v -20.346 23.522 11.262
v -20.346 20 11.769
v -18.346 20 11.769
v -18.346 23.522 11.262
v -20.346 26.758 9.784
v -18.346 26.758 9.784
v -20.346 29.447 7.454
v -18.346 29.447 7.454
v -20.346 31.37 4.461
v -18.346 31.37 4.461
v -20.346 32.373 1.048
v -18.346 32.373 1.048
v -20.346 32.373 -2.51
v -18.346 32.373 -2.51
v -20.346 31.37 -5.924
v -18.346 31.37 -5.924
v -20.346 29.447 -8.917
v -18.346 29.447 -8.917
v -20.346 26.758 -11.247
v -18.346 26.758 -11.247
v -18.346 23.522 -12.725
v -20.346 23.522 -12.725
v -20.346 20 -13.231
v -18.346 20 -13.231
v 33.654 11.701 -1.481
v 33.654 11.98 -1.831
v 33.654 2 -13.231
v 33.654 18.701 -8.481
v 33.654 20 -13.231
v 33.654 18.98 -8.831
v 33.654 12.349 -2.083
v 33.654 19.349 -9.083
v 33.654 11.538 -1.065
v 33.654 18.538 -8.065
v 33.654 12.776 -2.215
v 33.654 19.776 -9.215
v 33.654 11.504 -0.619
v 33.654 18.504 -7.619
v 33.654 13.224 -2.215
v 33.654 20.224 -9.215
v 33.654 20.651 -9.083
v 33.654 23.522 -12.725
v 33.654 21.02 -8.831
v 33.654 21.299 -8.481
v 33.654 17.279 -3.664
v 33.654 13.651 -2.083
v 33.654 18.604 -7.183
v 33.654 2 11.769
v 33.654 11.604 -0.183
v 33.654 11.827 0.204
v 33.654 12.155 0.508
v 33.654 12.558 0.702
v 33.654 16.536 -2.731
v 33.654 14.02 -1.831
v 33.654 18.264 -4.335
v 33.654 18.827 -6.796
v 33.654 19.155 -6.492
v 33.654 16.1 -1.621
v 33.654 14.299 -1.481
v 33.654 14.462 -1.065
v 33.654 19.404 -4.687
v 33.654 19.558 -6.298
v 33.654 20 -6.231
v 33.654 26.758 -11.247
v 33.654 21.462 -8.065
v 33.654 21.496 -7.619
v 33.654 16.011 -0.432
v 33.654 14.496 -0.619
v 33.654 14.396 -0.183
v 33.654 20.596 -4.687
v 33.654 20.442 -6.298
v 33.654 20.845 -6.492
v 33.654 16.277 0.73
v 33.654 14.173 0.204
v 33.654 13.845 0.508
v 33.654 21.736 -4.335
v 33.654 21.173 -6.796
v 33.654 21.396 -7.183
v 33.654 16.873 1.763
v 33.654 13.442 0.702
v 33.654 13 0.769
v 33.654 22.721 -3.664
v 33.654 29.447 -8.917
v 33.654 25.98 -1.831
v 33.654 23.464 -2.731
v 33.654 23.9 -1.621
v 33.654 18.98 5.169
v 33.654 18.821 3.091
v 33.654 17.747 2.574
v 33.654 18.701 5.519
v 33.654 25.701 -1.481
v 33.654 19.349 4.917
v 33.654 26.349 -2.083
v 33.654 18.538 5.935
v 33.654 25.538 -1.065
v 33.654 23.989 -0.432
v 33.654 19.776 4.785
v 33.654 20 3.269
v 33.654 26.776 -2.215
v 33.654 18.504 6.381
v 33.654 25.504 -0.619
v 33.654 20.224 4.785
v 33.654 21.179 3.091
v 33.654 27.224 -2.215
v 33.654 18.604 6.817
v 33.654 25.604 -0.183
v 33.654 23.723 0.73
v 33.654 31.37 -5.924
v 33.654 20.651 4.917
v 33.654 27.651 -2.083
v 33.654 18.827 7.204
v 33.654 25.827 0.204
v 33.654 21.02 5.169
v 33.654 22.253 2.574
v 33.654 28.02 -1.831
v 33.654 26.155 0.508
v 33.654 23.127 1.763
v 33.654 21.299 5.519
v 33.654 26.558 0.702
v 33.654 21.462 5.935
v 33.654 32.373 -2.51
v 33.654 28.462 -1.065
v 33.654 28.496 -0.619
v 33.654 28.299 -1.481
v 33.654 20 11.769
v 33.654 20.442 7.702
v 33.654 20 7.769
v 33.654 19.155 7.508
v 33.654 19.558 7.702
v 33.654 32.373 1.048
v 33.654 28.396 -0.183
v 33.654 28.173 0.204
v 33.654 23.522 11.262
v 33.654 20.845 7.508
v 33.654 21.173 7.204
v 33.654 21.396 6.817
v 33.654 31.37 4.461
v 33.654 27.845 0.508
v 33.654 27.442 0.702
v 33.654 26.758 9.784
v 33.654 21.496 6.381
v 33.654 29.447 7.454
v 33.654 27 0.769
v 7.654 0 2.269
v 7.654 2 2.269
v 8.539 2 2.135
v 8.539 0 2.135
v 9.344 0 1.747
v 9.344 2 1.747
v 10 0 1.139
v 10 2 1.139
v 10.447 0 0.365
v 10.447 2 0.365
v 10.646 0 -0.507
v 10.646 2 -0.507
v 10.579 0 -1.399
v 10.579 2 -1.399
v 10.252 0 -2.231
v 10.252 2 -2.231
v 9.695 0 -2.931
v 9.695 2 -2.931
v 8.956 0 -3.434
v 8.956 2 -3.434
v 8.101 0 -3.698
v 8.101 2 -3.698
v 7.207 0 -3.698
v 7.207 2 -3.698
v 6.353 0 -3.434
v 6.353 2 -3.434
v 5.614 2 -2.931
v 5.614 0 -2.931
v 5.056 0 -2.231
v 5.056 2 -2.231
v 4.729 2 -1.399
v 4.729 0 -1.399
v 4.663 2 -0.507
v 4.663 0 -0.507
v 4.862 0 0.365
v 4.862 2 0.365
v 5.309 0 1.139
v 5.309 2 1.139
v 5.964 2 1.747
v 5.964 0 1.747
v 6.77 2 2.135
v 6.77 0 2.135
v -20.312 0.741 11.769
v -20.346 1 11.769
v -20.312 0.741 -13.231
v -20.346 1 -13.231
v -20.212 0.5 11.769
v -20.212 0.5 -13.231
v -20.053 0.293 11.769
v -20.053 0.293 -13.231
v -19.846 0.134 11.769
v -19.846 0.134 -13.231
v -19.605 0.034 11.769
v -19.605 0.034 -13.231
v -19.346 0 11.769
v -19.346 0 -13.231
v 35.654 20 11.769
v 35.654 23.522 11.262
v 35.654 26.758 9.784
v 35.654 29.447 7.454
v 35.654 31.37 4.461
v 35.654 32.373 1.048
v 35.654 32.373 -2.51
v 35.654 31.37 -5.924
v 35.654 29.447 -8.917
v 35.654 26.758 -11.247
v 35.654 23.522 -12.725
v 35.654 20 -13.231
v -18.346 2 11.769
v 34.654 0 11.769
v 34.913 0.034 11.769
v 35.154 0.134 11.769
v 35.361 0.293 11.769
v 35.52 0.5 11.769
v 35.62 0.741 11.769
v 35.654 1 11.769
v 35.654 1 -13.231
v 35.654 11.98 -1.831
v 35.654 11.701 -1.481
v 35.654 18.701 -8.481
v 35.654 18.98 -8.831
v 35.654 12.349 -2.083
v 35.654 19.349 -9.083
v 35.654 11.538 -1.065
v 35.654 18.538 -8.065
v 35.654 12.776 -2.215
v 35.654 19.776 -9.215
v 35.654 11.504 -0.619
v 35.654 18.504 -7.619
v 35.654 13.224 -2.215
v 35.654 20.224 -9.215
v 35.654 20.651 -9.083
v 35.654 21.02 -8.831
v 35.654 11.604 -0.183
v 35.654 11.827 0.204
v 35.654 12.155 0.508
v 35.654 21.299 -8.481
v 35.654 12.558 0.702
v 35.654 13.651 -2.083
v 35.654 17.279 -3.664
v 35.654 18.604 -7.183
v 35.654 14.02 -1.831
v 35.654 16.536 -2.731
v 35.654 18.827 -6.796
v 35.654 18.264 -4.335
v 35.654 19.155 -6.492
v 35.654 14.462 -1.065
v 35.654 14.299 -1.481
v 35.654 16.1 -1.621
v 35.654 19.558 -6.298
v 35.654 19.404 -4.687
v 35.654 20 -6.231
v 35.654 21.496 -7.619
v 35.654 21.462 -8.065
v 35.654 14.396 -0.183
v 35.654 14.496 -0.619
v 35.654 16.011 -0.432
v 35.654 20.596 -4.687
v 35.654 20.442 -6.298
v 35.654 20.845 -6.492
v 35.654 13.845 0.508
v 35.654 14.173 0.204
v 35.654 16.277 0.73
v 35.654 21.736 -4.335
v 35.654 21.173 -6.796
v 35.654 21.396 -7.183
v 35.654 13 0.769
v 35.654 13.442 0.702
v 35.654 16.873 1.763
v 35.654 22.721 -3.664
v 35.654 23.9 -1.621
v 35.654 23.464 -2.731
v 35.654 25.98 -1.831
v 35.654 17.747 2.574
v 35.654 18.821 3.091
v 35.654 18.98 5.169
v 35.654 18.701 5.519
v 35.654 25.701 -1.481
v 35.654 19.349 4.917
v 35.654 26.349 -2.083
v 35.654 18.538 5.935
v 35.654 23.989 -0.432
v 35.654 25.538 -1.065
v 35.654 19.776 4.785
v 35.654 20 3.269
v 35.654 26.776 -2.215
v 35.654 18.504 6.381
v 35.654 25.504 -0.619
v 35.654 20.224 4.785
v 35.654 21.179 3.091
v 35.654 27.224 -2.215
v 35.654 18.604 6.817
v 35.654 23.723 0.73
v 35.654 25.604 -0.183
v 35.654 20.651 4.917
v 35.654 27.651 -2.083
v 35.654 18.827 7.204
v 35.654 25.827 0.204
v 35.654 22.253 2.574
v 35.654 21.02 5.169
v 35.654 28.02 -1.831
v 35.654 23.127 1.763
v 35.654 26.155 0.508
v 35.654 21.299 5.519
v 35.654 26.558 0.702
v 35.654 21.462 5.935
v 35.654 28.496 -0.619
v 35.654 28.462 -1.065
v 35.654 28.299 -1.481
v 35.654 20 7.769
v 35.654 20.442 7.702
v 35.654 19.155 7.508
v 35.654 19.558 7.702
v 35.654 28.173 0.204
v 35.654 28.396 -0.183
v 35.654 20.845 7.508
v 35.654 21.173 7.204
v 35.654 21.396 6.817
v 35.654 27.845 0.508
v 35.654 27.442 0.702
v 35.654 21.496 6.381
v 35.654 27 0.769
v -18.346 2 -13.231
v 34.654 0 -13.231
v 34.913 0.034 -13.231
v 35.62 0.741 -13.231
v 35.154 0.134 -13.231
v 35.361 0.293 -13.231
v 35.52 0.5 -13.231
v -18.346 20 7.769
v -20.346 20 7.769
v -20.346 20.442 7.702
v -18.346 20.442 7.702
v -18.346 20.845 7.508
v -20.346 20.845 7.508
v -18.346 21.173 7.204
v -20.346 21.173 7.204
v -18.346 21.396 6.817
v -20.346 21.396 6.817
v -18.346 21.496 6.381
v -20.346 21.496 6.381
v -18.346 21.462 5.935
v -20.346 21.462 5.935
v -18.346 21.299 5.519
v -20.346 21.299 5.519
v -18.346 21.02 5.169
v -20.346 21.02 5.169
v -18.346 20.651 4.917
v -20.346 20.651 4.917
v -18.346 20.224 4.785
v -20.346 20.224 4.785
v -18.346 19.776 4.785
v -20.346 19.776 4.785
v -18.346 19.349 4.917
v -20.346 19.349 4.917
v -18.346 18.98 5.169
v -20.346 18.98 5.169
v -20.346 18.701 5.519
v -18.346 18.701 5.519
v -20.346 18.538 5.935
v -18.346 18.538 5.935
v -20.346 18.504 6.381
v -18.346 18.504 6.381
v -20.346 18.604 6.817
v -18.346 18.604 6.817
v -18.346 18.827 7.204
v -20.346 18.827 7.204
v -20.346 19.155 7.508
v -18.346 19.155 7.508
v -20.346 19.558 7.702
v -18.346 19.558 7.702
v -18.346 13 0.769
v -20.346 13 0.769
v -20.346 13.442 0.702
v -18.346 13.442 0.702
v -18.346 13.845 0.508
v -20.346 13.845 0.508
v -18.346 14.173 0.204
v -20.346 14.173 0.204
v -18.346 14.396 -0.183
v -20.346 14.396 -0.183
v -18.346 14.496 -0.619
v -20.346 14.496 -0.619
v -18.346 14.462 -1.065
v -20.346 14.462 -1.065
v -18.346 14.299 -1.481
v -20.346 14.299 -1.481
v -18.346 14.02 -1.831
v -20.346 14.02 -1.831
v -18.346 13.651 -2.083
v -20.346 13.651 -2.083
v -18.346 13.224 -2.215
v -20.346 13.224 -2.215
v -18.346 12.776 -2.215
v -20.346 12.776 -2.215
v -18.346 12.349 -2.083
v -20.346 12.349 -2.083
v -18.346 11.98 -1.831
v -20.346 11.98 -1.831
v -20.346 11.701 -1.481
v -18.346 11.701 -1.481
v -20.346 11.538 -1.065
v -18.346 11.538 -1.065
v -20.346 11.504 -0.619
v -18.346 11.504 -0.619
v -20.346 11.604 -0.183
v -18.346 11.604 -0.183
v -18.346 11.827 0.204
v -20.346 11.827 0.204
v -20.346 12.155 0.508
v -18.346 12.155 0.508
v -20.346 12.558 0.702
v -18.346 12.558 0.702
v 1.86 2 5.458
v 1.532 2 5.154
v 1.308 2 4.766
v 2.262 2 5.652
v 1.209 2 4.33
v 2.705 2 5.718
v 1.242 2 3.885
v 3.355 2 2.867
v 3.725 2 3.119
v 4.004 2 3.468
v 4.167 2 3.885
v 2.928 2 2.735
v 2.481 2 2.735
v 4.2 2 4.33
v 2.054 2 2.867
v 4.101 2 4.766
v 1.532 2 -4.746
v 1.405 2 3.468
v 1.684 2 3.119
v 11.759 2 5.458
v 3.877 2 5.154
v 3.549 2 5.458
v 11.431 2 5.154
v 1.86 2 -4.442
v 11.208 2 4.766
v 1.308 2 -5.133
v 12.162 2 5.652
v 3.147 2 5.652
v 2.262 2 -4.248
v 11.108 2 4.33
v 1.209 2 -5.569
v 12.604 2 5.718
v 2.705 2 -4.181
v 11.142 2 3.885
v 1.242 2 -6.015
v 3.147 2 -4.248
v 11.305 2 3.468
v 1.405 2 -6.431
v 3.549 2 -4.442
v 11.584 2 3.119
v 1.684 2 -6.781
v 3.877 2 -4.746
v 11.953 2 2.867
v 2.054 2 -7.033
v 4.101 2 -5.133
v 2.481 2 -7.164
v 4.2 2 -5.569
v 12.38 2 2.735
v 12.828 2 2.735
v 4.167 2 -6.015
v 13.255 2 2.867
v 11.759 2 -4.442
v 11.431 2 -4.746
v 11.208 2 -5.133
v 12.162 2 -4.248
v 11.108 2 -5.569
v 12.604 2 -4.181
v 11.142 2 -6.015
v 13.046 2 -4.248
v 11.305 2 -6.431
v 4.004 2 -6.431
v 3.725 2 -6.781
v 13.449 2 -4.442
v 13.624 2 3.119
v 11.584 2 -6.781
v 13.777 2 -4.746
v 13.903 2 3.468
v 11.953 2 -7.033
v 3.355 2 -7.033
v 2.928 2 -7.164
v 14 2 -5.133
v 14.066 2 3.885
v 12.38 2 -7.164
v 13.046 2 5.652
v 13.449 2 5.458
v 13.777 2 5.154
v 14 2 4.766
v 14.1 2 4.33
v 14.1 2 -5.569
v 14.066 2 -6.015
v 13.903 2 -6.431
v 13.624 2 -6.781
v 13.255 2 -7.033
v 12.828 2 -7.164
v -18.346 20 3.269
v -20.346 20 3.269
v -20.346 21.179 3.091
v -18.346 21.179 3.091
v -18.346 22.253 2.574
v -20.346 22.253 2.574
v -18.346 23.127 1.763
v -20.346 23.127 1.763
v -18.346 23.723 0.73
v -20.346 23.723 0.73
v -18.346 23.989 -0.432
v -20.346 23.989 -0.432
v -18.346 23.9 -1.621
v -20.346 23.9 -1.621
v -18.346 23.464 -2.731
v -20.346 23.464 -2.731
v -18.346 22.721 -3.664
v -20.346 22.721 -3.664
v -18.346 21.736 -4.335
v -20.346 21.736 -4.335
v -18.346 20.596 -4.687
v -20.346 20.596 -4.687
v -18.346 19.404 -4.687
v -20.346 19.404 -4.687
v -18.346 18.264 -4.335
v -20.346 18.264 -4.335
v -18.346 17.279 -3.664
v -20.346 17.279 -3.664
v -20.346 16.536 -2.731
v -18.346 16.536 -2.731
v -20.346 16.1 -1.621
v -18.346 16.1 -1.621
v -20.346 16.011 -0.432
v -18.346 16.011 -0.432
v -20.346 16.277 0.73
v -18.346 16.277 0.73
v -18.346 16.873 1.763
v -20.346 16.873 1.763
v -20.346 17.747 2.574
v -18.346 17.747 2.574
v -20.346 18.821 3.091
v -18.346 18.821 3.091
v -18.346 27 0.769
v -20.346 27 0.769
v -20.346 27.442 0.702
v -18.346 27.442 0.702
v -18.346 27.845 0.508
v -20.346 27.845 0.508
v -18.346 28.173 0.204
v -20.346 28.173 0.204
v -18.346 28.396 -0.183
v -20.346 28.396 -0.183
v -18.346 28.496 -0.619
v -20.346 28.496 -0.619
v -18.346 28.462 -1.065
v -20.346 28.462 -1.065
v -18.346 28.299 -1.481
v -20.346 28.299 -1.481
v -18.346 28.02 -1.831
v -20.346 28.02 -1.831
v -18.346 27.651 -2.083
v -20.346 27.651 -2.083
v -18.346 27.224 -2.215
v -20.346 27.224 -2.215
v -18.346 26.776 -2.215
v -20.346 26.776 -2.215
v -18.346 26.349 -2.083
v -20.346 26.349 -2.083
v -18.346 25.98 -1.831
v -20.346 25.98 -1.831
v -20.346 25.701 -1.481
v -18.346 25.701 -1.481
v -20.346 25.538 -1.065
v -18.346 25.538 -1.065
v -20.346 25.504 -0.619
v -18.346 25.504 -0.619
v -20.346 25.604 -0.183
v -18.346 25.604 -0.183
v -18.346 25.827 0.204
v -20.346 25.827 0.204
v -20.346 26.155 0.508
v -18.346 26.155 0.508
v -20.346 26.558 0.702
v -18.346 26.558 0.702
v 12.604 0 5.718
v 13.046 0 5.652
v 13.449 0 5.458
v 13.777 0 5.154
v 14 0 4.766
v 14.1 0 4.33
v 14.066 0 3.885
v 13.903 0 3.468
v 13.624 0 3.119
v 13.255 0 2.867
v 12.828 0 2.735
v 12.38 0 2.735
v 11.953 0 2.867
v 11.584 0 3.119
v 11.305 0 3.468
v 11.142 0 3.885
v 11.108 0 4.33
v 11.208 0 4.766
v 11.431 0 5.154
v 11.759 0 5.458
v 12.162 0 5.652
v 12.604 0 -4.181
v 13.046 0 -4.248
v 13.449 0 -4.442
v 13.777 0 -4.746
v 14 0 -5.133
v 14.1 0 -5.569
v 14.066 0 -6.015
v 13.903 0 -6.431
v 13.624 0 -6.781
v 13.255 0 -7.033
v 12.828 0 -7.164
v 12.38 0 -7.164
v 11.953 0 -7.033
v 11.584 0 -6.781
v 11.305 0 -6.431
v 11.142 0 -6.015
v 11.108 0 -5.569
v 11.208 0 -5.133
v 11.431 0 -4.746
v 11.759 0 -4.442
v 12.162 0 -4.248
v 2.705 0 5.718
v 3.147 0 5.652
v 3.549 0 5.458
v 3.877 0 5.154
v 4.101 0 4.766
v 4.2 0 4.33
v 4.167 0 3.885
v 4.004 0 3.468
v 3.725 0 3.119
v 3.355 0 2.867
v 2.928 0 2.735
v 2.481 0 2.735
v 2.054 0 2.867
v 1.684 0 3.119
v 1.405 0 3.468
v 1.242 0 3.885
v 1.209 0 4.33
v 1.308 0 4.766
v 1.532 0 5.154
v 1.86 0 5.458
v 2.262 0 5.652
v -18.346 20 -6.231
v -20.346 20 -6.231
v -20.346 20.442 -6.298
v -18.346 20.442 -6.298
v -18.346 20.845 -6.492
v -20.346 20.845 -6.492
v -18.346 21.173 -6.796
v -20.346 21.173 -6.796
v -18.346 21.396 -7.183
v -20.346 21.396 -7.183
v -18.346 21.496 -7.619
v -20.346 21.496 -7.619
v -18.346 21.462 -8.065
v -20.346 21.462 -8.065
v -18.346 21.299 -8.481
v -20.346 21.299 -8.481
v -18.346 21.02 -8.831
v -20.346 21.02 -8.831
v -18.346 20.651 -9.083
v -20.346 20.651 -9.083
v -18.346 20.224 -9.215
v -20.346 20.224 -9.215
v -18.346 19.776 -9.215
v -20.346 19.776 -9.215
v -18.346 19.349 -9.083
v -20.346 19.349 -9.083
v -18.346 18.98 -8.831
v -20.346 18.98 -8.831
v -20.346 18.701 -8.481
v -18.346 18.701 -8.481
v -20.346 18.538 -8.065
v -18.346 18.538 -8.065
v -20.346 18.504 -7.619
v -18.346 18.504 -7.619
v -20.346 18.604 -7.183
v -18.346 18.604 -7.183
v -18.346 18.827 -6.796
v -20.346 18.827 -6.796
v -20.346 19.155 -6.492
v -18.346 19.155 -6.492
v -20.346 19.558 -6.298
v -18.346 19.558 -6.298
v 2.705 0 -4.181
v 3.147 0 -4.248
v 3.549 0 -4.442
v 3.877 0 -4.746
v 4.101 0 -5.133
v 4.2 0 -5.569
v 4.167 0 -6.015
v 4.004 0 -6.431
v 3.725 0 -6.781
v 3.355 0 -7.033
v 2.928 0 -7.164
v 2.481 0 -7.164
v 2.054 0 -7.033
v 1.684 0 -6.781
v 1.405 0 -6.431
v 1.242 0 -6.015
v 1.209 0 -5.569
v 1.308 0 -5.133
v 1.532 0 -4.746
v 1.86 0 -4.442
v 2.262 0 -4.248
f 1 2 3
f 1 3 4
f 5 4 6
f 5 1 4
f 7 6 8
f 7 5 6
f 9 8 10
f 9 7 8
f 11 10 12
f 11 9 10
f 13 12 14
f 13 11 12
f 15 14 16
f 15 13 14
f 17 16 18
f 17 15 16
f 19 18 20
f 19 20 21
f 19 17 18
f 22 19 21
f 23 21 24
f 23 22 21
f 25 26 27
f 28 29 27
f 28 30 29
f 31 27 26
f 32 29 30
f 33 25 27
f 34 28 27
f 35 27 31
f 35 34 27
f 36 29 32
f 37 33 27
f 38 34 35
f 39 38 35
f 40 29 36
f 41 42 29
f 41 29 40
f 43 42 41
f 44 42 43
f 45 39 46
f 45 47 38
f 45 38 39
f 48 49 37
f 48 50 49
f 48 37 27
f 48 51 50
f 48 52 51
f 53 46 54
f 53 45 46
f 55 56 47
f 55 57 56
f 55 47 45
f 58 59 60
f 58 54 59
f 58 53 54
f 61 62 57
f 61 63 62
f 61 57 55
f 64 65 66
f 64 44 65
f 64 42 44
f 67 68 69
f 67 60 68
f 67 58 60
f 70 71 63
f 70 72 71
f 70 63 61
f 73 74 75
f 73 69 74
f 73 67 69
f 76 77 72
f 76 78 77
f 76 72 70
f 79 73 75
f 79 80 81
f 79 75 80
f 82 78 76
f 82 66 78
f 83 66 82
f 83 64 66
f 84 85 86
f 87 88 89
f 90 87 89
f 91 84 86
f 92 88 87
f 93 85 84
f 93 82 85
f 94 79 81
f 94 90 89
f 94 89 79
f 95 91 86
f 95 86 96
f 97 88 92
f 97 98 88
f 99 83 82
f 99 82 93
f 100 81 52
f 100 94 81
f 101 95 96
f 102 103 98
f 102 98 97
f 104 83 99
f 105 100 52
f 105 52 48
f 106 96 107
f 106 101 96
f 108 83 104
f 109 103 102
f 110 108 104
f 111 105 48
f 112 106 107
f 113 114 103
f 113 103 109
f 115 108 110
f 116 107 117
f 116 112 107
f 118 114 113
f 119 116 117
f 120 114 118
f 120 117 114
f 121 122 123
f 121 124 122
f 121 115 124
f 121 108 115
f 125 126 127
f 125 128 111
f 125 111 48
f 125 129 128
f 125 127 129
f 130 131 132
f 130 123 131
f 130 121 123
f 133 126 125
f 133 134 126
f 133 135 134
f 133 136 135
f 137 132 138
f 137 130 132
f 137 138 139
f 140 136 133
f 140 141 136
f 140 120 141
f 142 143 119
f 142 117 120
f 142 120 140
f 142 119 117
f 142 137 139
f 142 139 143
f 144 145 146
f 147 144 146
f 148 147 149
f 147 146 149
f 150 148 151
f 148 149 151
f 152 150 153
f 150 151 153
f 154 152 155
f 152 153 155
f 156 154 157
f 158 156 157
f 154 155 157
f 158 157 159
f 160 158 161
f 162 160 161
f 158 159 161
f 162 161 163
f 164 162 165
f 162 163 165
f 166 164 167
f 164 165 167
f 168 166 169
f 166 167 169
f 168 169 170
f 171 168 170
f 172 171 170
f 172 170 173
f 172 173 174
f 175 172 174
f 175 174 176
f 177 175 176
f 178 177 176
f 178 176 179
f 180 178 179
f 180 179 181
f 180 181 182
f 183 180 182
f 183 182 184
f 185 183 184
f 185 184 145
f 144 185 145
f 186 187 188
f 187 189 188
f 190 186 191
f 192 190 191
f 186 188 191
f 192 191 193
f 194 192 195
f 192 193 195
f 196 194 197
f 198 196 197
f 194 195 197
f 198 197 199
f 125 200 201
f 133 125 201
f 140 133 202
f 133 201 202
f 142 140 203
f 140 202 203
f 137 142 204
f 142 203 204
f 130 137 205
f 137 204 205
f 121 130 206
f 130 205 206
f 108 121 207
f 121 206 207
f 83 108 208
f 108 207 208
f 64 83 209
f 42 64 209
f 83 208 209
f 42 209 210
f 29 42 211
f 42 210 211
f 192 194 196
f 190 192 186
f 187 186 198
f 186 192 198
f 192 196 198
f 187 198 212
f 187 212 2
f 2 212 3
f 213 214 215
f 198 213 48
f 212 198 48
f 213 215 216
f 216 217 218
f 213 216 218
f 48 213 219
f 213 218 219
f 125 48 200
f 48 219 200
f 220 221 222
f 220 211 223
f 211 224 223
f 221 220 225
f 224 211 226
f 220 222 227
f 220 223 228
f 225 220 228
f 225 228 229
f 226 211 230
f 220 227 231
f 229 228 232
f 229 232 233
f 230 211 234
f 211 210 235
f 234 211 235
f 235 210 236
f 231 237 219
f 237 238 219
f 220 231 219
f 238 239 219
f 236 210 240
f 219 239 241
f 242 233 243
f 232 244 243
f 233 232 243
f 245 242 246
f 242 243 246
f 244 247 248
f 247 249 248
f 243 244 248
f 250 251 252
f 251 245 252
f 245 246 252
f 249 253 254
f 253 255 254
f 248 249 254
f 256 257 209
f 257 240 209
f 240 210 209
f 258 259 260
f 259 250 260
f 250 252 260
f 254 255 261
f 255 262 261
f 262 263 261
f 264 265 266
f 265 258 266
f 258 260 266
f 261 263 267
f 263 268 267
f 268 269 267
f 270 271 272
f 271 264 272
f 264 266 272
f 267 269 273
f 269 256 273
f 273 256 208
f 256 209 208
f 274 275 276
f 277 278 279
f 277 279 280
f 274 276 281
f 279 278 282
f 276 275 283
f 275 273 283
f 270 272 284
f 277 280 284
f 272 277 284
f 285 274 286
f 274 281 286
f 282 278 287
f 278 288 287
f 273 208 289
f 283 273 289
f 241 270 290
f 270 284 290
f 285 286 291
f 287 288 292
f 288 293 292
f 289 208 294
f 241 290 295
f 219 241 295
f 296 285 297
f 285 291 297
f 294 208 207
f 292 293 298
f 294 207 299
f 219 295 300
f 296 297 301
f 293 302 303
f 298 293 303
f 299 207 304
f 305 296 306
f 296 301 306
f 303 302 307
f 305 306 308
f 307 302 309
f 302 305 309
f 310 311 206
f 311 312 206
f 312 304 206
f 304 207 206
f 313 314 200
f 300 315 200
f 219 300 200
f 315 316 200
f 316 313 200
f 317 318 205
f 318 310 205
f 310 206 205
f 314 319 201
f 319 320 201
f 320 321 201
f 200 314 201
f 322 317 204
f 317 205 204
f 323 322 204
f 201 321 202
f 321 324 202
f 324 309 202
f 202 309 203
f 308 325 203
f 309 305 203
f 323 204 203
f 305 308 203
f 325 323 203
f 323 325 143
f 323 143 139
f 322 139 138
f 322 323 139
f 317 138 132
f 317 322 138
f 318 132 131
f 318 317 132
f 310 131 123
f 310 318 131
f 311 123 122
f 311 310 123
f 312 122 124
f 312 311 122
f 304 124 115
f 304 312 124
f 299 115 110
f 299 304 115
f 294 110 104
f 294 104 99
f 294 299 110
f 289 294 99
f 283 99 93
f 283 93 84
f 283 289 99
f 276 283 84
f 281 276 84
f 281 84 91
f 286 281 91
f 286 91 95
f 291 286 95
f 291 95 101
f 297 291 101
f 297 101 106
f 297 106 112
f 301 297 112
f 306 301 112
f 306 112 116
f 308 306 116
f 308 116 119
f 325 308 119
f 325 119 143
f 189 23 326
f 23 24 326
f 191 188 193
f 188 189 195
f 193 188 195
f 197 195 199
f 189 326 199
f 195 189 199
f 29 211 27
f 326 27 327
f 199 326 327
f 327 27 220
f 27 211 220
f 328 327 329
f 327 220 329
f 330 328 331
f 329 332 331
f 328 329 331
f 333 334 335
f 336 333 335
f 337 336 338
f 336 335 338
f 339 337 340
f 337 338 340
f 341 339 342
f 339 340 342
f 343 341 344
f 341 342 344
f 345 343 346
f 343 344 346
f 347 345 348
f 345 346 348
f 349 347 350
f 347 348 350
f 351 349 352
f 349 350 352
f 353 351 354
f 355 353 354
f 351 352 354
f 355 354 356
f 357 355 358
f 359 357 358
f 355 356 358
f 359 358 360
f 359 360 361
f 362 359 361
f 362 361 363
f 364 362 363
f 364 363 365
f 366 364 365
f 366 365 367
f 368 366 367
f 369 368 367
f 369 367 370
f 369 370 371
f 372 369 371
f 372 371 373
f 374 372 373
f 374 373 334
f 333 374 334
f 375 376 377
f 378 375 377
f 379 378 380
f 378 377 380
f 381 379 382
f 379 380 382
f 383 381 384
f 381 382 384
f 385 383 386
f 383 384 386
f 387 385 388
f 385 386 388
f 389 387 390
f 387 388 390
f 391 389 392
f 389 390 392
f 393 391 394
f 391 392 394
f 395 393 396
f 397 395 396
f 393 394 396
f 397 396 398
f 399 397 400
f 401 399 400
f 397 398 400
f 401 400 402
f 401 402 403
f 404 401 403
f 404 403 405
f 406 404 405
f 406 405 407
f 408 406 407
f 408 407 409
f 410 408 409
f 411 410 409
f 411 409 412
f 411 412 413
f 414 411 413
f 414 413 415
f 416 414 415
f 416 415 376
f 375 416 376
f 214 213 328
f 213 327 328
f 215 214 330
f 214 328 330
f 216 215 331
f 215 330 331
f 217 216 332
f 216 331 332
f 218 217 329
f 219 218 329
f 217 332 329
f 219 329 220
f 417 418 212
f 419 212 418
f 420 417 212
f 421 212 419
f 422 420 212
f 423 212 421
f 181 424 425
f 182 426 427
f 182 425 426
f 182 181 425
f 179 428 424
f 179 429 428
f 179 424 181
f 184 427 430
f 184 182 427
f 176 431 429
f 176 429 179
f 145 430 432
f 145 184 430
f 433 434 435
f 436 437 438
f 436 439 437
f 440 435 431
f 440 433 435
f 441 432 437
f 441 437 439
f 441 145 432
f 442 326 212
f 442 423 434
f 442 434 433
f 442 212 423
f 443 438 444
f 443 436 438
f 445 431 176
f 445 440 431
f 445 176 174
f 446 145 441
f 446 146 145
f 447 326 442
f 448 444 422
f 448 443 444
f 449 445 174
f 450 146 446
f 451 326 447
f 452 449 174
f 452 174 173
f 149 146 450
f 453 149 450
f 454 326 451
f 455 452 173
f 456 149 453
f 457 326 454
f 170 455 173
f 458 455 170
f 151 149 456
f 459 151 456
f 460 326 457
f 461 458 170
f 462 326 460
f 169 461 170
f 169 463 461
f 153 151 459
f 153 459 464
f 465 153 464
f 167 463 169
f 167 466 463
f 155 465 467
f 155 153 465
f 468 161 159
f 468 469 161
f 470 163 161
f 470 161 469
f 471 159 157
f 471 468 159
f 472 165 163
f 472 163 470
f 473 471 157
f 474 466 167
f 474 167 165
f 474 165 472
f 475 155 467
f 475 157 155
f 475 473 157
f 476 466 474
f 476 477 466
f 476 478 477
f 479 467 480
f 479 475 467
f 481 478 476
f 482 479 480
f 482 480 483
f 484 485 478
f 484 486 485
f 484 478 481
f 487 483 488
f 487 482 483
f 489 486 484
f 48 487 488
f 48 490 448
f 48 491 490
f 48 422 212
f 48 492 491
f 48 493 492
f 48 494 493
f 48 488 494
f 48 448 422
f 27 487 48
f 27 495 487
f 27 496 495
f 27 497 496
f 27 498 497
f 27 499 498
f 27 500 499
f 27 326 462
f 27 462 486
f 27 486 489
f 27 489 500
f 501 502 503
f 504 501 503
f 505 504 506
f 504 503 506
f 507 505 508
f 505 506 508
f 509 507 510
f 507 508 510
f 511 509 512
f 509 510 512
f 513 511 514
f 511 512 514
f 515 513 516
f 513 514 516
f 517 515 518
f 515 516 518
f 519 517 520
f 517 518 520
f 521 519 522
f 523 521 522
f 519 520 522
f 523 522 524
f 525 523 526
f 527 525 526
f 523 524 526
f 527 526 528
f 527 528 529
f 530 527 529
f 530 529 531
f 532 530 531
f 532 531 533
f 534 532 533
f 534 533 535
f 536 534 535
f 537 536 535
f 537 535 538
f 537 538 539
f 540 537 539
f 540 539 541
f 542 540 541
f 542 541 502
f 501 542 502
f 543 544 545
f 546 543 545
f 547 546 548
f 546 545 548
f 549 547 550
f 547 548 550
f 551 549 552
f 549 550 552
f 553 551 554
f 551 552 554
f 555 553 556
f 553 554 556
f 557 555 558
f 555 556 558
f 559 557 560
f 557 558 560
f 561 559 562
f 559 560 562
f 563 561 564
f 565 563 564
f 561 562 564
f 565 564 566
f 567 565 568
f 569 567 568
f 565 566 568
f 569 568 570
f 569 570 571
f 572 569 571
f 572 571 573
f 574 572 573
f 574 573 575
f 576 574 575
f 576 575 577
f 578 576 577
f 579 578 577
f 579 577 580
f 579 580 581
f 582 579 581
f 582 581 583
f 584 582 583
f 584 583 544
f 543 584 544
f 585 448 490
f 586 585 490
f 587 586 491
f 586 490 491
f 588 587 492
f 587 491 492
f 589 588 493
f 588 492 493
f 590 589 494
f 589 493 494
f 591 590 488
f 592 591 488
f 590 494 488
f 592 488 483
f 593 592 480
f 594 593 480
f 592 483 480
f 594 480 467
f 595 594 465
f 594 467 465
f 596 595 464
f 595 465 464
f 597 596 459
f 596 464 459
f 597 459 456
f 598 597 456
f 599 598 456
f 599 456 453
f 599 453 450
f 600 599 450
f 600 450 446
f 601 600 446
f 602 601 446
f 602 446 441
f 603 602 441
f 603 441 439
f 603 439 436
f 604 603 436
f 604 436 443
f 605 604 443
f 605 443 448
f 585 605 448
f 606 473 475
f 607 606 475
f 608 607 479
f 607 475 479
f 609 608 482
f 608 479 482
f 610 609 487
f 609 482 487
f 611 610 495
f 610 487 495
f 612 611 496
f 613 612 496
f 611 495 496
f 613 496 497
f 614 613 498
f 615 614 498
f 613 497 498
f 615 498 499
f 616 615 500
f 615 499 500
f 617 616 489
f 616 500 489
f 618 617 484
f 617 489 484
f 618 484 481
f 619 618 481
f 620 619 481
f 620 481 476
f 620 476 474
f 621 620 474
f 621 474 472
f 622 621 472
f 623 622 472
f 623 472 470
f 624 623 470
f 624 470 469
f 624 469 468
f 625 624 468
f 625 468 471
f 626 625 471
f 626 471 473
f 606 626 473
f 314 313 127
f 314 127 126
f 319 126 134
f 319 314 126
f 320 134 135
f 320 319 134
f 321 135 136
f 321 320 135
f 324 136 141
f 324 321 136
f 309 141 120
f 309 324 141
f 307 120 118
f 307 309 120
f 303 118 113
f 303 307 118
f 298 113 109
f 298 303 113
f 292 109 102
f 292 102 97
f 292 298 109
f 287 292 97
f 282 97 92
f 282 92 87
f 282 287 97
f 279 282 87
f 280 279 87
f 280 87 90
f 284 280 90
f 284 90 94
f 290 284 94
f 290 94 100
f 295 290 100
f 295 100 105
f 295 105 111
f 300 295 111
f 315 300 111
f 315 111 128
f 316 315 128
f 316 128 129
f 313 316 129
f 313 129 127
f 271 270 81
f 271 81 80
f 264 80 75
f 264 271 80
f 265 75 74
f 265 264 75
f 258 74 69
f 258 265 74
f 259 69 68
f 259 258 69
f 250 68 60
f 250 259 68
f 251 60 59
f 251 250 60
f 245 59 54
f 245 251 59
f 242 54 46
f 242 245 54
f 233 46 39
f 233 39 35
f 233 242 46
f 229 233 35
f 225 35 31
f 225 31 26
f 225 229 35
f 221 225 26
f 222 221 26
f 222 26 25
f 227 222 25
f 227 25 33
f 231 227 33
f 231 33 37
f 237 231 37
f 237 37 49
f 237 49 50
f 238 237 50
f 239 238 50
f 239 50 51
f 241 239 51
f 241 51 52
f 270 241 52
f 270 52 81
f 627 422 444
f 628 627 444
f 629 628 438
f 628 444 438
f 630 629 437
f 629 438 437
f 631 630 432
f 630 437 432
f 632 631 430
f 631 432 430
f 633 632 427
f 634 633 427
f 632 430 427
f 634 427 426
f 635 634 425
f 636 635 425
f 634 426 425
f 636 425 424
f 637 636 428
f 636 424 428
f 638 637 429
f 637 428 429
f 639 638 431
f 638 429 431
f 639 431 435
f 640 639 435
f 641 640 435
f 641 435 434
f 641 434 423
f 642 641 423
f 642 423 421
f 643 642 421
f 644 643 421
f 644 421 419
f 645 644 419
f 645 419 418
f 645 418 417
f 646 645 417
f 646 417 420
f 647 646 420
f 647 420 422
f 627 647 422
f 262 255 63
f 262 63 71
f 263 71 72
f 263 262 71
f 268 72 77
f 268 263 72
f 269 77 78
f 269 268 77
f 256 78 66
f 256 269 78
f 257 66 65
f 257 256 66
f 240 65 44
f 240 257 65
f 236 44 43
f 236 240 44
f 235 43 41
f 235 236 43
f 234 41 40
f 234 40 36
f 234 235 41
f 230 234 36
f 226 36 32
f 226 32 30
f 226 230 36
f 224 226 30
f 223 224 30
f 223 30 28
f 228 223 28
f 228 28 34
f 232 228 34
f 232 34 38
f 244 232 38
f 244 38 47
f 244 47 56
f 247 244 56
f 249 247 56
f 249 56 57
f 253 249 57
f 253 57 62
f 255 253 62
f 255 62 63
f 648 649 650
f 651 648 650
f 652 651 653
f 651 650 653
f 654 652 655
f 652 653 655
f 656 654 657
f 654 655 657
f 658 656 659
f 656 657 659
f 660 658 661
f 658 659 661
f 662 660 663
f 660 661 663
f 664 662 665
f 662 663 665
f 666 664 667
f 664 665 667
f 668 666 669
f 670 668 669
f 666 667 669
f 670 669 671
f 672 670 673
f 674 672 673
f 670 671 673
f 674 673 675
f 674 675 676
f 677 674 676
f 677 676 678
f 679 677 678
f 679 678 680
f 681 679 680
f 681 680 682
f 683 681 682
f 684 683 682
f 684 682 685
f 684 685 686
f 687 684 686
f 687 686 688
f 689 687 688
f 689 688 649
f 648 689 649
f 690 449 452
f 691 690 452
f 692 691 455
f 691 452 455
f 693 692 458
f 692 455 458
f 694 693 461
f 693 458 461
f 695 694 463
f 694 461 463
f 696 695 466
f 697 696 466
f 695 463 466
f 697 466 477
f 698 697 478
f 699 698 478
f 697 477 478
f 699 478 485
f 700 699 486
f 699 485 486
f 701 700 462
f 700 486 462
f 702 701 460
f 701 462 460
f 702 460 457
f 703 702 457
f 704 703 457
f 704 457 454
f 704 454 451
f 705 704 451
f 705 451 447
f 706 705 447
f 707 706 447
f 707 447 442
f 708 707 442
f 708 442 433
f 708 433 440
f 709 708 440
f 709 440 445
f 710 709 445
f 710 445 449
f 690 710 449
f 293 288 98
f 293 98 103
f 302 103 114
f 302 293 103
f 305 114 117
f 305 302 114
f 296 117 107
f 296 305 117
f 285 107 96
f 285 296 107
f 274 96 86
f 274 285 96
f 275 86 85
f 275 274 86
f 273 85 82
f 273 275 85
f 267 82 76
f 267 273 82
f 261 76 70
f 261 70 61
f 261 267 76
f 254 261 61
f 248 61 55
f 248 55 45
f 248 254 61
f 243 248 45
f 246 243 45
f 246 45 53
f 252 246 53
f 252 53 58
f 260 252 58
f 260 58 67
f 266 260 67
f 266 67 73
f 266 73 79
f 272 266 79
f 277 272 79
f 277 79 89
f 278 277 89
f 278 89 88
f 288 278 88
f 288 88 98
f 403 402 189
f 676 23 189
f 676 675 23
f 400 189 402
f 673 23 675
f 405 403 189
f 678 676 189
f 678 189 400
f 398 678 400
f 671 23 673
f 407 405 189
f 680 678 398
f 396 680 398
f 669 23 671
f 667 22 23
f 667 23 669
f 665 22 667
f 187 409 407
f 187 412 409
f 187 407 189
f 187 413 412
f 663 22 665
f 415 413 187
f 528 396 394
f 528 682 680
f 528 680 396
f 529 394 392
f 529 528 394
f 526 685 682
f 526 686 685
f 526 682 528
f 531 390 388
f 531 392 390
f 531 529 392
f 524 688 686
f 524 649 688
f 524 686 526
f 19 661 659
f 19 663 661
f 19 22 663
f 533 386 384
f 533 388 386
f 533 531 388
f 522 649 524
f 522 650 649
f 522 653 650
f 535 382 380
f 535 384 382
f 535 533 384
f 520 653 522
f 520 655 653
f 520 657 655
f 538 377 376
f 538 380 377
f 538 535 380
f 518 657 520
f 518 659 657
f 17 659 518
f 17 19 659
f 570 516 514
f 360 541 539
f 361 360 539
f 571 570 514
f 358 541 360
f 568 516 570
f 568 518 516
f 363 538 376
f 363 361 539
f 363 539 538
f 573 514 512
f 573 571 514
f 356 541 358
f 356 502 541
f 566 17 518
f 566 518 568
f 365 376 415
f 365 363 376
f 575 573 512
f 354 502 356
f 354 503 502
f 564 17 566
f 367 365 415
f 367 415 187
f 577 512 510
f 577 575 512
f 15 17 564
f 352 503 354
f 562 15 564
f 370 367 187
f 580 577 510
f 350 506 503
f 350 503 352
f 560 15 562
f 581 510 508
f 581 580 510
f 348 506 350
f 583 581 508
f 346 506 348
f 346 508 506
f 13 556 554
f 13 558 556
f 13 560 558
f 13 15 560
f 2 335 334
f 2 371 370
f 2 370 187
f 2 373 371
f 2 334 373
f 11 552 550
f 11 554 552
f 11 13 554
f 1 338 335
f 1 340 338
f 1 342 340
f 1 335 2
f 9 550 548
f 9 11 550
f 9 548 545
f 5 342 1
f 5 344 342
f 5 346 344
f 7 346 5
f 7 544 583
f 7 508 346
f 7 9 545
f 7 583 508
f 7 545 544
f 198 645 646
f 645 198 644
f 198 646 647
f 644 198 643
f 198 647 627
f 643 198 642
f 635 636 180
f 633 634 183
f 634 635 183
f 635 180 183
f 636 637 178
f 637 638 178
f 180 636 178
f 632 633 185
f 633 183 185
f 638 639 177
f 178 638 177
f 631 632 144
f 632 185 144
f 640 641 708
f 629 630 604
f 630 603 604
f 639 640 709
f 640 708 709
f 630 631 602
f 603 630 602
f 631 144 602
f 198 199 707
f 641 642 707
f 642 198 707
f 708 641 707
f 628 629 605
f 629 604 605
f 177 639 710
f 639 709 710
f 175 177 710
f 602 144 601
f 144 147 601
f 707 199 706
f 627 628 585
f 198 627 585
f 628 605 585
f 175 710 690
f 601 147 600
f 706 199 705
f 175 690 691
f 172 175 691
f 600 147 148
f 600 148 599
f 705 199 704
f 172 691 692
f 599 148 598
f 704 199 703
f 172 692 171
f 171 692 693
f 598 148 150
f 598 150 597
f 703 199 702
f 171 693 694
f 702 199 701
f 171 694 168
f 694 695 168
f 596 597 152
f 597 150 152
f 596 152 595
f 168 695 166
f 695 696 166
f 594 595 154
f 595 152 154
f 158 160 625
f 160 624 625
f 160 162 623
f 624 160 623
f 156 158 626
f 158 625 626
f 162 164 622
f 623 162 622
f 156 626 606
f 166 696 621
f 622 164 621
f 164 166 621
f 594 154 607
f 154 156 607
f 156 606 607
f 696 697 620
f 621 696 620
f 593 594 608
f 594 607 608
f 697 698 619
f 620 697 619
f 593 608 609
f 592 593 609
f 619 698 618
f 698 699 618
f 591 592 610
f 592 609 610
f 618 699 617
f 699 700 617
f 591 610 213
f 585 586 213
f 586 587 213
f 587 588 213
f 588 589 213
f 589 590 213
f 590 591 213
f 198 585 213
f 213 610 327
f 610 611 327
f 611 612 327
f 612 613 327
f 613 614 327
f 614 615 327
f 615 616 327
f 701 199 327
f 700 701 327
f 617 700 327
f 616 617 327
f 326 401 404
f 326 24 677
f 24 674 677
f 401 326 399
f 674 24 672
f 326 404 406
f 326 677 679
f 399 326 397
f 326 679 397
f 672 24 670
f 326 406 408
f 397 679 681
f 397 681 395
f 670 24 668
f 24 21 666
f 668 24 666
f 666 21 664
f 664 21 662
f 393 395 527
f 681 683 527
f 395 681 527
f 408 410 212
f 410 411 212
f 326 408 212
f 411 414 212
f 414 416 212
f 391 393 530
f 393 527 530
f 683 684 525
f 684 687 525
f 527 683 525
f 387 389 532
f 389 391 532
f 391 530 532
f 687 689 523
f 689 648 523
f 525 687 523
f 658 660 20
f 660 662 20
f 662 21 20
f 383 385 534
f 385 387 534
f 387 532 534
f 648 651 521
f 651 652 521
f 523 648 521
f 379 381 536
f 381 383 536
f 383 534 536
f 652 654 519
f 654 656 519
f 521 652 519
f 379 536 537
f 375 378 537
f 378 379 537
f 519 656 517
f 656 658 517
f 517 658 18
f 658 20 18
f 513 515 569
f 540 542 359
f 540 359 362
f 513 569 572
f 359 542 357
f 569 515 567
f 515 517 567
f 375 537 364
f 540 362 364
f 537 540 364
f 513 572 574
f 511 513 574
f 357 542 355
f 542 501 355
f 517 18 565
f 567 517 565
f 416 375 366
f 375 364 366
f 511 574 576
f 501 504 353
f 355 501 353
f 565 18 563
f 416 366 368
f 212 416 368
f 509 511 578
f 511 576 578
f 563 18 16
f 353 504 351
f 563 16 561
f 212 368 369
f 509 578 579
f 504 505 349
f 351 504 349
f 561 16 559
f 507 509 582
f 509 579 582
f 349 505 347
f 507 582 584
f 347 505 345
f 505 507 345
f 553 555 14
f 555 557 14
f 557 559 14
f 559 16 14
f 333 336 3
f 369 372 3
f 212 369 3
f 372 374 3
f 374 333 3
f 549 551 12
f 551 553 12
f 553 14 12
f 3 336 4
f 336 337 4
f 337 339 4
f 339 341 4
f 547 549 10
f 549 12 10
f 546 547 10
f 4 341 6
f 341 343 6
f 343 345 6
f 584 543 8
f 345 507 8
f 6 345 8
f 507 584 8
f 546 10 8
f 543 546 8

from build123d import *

# Parameters (mm, degrees)
SKETCH_1_W          = 56
SKETCH_1_H          = 25
EXTRUDE_1_DEPTH     = 2
SKETCH_2_R          = 3
SKETCH_2_R_2        = 1.5
CUT_EXTRUDE_1_DEPTH = 39.082744359
EXTRUDE_2_DEPTH     = 2
CUT_EXTRUDE_2_REACH = 68.086
SKETCH_4_R          = 4
SKETCH_4_R_2        = 1.5
FILLET_1_R          = 1


with BuildPart() as part:
    # 草图1 → 凸台-拉伸1 (new body)
    with BuildSketch(Plane(origin=(0, 0, 0), x_dir=(1, 0, 0), z_dir=(0, 1, 0))):
        with Locations((7.654255319, 0.731382979)):
            Rectangle(SKETCH_1_W, SKETCH_1_H)
    extrude(amount=EXTRUDE_1_DEPTH)

    # 草图2 → 切除-拉伸1 (cut, through all)
    with BuildSketch(Plane(origin=(0, 2, 0), x_dir=(1, 0, 0), z_dir=(0, 1, 0))):
        with Locations(Location((7.654255319, 0.731382979, 0), (0, 0, 270))):
            Circle(SKETCH_2_R)
        with Locations(Location((12.604002787, 5.681130447, 0), (0, 0, 270))):
            Circle(SKETCH_2_R_2)
        with Locations(Location((2.704507851, 5.681130447, 0), (0, 0, 270))):
            Circle(SKETCH_2_R_2)
        with Locations(Location((12.604002787, -4.21836449, 0), (0, 0, 270))):
            Circle(SKETCH_2_R_2)
        with Locations(Location((2.704507851, -4.21836449, 0), (0, 0, 270))):
            Circle(SKETCH_2_R_2)
    extrude(amount=-CUT_EXTRUDE_1_DEPTH, mode=Mode.SUBTRACT)

    # 草图3 → 凸台-拉伸2 (add)
    with BuildSketch(Plane.ZY.offset(20.345744681)):
        with BuildLine():
            Line((-13.231382979, 20), (-13.231382979, 2))
            Line((-13.231382979, 2), (11.768617021, 2))
            Line((11.768617021, 2), (11.768617021, 20))
            ThreePointArc((11.768617021, 20), (-0.731382979, 32.5), (-13.231382979, 20))
        make_face()
    extrude_2 = extrude(amount=-EXTRUDE_2_DEPTH)

    # 草图4 → 切除-拉伸2 (cut, up to next)
    with BuildSketch(Plane.ZY.offset(20.345744681), mode=Mode.PRIVATE) as cut_extrude_2_sk1:
        with Locations((-0.731382979, 20)):
            Circle(SKETCH_4_R)
    cut_extrude_2_tool1 = extrude(cut_extrude_2_sk1.sketch, amount=-CUT_EXTRUDE_2_REACH, mode=Mode.PRIVATE) & part.part
    # 草图4 → 切除-拉伸2 (cut, up to next)
    with BuildSketch(Plane.ZY.offset(20.345744681), mode=Mode.PRIVATE) as cut_extrude_2_sk2:
        with Locations((-0.731382979, 27)):
            Circle(SKETCH_4_R_2)
    cut_extrude_2_tool2 = extrude(cut_extrude_2_sk2.sketch, amount=-CUT_EXTRUDE_2_REACH, mode=Mode.PRIVATE) & part.part
    # 草图4 → 切除-拉伸2 (cut, up to next)
    with BuildSketch(Plane.ZY.offset(20.345744681), mode=Mode.PRIVATE) as cut_extrude_2_sk3:
        with Locations((6.268617021, 20)):
            Circle(SKETCH_4_R_2)
    cut_extrude_2_tool3 = extrude(cut_extrude_2_sk3.sketch, amount=-CUT_EXTRUDE_2_REACH, mode=Mode.PRIVATE) & part.part
    # 草图4 → 切除-拉伸2 (cut, up to next)
    with BuildSketch(Plane.ZY.offset(20.345744681), mode=Mode.PRIVATE) as cut_extrude_2_sk4:
        with Locations((-0.731382979, 13)):
            Circle(SKETCH_4_R_2)
    cut_extrude_2_tool4 = extrude(cut_extrude_2_sk4.sketch, amount=-CUT_EXTRUDE_2_REACH, mode=Mode.PRIVATE) & part.part
    # 草图4 → 切除-拉伸2 (cut, up to next)
    with BuildSketch(Plane.ZY.offset(20.345744681), mode=Mode.PRIVATE) as cut_extrude_2_sk5:
        with Locations((-7.731382979, 20)):
            Circle(SKETCH_4_R_2)
    cut_extrude_2_tool5 = extrude(cut_extrude_2_sk5.sketch, amount=-CUT_EXTRUDE_2_REACH, mode=Mode.PRIVATE) & part.part
    cut_extrude_2_1 = cut_extrude_2_tool1.solids().sort_by_distance((-20.345745, 20, -0.731383))[0]
    add(cut_extrude_2_1, mode=Mode.SUBTRACT)
    cut_extrude_2_2 = cut_extrude_2_tool2.solids().sort_by_distance((-20.345745, 27, -0.731383))[0]
    add(cut_extrude_2_2, mode=Mode.SUBTRACT)
    cut_extrude_2_3 = cut_extrude_2_tool3.solids().sort_by_distance((-20.345745, 20, 6.268617))[0]
    add(cut_extrude_2_3, mode=Mode.SUBTRACT)
    cut_extrude_2_4 = cut_extrude_2_tool4.solids().sort_by_distance((-20.345745, 13, -0.731383))[0]
    add(cut_extrude_2_4, mode=Mode.SUBTRACT)
    cut_extrude_2_5 = cut_extrude_2_tool5.solids().sort_by_distance((-20.345745, 20, -7.731383))[0]
    add(cut_extrude_2_5, mode=Mode.SUBTRACT)
    cut_extrude_2 = cut_extrude_2_1 + cut_extrude_2_2 + cut_extrude_2_3 + cut_extrude_2_4 + cut_extrude_2_5  # 切除-拉伸2 as one shape, for the pattern or mirror that repeats it

    # 镜向1: 凸台-拉伸2, 切除-拉伸2 across plane
    add(extrude_2.mirror(Plane.ZY.offset(-7.654255319)))
    add(cut_extrude_2.mirror(Plane.ZY.offset(-7.654255319)), mode=Mode.SUBTRACT)

    # 圆角1
    fillet_1_edges = [part.edges().sort_by_distance(p)[0] for p in [
        (35.654255319, 0, -0.731382979),
        (-20.345744681, 0, -0.731382979),
    ]]
    fillet(fillet_1_edges, radius=FILLET_1_R)


solid = part.part
